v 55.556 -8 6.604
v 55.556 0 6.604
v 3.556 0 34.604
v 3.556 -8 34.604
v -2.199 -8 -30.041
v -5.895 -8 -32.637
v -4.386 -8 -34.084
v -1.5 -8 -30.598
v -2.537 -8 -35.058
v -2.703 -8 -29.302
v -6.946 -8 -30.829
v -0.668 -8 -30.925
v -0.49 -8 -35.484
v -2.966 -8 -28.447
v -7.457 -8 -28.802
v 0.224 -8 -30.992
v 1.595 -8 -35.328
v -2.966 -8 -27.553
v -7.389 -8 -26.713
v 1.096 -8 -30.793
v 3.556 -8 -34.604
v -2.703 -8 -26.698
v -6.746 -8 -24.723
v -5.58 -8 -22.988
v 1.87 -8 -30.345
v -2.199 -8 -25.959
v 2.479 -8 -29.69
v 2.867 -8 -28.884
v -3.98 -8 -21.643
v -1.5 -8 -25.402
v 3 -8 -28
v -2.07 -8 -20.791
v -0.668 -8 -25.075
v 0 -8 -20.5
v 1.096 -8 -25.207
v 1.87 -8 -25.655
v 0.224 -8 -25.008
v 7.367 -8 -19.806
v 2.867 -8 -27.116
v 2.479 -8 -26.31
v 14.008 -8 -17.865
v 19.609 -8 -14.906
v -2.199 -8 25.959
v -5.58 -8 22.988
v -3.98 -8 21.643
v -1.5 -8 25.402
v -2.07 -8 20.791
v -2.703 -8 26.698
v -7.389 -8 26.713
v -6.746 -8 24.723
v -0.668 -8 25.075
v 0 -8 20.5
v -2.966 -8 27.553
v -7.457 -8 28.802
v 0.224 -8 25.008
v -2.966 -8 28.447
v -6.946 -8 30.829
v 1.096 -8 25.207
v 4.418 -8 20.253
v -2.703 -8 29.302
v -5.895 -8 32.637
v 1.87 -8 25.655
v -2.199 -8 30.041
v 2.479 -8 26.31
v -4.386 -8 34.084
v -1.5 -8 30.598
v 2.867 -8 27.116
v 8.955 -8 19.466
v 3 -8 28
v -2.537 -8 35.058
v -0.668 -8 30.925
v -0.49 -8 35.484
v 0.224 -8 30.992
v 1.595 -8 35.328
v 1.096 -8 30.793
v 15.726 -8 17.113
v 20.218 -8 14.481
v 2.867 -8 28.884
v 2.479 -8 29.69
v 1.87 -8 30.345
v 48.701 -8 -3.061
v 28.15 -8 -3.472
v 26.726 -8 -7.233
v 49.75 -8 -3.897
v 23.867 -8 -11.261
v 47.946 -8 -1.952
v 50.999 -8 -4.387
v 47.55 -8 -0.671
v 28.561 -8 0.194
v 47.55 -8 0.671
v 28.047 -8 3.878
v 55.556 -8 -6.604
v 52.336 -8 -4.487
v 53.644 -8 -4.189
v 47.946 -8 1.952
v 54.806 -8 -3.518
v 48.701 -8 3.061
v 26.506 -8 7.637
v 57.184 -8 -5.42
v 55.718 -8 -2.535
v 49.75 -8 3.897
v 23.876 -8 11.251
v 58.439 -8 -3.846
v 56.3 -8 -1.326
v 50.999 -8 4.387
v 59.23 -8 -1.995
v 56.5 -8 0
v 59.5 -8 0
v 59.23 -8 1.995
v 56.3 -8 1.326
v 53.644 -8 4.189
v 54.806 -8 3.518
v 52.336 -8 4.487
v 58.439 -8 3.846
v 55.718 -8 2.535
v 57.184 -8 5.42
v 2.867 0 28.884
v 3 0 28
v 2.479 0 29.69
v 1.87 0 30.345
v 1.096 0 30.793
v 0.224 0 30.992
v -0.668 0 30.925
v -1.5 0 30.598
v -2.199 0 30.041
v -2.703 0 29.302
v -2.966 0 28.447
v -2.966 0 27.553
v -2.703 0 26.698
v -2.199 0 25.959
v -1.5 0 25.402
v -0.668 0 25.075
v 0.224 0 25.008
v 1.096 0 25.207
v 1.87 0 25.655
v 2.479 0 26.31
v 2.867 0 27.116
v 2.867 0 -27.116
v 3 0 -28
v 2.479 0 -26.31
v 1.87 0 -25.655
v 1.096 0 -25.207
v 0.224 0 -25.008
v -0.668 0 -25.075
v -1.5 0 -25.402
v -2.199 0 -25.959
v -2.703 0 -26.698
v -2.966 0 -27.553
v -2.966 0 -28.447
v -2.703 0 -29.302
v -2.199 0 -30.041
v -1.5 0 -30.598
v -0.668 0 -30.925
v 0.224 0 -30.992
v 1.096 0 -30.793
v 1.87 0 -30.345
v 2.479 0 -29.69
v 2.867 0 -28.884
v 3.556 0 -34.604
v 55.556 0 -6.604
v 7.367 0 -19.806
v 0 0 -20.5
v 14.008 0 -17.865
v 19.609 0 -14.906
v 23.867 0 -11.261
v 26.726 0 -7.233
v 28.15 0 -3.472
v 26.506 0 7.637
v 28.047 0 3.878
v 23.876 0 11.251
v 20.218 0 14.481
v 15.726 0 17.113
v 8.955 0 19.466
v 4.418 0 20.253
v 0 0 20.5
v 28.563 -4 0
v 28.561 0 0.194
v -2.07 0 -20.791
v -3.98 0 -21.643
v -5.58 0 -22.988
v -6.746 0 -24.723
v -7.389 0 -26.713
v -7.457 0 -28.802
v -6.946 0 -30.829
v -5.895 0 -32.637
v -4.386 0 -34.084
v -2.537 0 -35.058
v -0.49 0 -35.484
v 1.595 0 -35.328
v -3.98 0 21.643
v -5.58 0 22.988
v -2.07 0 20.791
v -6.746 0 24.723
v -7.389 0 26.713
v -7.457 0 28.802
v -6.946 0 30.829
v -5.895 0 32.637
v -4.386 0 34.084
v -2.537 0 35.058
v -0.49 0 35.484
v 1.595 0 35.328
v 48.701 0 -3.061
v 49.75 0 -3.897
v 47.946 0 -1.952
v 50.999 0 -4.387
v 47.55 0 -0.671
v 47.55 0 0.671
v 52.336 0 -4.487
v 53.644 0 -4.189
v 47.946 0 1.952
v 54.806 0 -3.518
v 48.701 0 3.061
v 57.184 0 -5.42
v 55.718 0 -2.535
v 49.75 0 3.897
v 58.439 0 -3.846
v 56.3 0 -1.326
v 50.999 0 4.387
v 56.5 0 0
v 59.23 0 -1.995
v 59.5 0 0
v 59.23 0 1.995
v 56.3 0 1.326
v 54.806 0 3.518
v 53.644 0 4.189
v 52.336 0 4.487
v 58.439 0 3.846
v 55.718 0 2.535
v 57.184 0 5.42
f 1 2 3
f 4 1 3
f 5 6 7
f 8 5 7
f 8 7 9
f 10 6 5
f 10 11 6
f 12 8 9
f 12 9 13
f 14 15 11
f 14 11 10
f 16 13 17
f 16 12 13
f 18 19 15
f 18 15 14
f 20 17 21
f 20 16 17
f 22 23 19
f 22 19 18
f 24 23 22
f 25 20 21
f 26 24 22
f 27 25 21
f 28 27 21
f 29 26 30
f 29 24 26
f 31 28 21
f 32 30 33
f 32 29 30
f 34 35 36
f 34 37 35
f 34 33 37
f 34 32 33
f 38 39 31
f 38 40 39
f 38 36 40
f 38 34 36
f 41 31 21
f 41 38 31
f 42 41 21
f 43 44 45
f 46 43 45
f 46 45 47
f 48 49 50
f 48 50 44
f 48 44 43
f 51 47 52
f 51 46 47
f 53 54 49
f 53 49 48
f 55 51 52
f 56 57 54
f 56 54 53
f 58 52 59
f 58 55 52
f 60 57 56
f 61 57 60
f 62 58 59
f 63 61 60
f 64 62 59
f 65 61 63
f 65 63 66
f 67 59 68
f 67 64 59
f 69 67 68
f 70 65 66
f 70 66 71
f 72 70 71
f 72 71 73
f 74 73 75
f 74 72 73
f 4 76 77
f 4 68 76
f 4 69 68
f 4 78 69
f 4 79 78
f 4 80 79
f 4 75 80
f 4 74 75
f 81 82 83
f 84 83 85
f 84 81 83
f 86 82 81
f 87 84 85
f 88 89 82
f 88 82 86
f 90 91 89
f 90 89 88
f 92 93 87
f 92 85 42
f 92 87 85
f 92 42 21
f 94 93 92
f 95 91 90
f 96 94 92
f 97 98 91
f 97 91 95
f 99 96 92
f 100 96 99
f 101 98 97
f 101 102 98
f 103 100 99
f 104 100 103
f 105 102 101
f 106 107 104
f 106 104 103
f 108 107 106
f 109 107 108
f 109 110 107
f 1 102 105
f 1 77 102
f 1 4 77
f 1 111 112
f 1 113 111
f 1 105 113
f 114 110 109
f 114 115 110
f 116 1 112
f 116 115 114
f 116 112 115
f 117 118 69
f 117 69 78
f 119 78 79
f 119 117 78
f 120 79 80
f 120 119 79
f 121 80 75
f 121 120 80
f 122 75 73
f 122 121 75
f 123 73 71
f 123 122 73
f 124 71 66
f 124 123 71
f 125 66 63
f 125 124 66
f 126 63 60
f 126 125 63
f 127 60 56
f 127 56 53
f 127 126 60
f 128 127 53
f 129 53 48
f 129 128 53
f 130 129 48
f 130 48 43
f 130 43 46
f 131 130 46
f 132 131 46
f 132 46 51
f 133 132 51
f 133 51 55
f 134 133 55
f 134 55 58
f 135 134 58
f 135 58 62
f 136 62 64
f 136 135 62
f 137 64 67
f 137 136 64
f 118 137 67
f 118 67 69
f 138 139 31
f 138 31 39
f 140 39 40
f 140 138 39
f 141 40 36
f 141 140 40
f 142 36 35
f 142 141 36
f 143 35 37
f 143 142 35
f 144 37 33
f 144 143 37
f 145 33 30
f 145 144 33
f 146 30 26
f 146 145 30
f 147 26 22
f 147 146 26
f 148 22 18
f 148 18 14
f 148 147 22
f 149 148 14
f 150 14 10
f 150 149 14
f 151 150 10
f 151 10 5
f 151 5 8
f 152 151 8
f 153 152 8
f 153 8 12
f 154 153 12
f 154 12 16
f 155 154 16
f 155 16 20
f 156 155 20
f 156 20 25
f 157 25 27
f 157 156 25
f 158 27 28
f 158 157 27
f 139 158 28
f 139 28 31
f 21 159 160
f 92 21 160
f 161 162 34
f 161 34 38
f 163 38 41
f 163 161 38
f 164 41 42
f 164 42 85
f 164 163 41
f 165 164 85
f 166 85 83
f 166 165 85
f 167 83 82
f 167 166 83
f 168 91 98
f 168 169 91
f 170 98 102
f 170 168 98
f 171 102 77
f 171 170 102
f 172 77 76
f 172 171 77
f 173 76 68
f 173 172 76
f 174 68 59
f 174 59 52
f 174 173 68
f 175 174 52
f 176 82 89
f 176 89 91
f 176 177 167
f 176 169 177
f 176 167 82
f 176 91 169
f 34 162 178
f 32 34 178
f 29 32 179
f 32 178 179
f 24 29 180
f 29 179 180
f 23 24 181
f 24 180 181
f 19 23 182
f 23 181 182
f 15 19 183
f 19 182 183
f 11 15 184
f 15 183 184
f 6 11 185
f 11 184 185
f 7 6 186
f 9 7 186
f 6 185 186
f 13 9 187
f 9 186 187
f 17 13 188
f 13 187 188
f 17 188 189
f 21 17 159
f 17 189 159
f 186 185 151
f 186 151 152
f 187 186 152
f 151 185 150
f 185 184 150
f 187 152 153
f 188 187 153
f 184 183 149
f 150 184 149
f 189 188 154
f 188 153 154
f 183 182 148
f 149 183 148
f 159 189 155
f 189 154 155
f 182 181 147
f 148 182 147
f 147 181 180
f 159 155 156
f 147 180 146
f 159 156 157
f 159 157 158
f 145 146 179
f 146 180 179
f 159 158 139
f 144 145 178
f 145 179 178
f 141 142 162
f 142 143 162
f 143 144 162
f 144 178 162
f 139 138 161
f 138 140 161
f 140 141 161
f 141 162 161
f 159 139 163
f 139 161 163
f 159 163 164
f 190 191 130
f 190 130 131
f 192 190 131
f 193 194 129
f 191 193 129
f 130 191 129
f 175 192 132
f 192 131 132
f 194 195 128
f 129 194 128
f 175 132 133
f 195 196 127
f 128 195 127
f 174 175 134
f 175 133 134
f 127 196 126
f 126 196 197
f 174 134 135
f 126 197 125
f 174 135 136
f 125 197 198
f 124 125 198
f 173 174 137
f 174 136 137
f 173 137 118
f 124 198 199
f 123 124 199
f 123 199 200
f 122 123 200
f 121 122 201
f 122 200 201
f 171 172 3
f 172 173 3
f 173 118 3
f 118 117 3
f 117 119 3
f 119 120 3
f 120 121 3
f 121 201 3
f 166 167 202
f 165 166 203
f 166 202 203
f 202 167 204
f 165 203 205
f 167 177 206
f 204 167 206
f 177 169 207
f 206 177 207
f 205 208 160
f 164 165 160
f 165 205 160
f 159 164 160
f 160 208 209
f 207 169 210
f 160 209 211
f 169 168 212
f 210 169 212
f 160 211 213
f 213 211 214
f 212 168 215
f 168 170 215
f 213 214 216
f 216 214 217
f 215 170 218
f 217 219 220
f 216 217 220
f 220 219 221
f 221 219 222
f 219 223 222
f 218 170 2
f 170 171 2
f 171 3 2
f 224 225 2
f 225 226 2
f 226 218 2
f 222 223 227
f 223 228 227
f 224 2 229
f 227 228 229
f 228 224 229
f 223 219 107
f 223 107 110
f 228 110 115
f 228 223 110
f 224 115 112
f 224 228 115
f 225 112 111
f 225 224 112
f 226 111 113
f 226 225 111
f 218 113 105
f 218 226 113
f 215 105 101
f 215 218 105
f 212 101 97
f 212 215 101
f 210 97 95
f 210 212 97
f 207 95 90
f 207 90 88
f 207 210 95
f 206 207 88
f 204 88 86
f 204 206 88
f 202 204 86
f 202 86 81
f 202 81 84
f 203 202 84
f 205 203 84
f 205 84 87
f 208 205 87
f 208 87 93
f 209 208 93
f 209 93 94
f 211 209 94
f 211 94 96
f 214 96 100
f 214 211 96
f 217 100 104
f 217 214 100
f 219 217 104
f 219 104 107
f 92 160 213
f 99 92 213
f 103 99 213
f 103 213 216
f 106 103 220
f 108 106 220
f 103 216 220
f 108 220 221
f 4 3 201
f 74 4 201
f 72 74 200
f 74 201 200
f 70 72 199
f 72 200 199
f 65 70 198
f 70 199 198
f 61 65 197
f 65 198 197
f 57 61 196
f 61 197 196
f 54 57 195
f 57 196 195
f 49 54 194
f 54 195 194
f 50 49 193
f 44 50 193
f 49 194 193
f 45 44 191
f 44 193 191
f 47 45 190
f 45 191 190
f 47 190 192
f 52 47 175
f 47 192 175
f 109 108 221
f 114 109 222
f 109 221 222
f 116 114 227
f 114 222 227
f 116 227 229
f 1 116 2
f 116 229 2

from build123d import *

# Parameters (mm, degrees)
F0_R     = 3
F0_R_2   = 4.5
F1_DEPTH = 8


with BuildPart() as f1:
    # F0 (on Front) → F1 (new body)
    with BuildSketch(Plane.XZ):
        with BuildLine():
            ThreePointArc((0, 20.5), (5.3033008589, 22.6966991411), (7.5, 28))
            ThreePointArc((7.5, 28), (6.4388708267, 31.8458994367), (3.5557486728, 34.6035332494))
            ThreePointArc((3.5557486728, 34.6035332494), (-7.2724307962, 29.8335076533), (0, 20.5))
        make_face()
        with Locations((0, 28)):
            Circle(F0_R, mode=Mode.SUBTRACT)
        with BuildLine():
            ThreePointArc((3.5557486728, 34.6035332494), (6.4388708267, 31.8458994367), (7.5, 28))
            ThreePointArc((7.5, 28), (5.3033008589, 22.6966991411), (0, 20.5))
            add(Edge.make_bspline(
                [(0, -20.5), (28.5625234834, -20.5), (28.5625234834, 0), (28.5625234834, 20.5), (0, 20.5)],
                knots=[4.7123889804, 4.7123889804, 4.7123889804, 6.2831853072, 6.2831853072, 7.853981634, 7.853981634, 7.853981634], degree=2, weights=[1, 0.7071067812, 1, 0.7071067812, 1]))
            ThreePointArc((0, -20.5), (5.3033008589, -22.6966991411), (7.5, -28))
            ThreePointArc((7.5, -28), (6.4388708267, -31.8458994367), (3.5557486728, -34.6035332494))
            Line((3.5557486728, -34.6035332494), (55.5557486728, -6.6035332494))
            ThreePointArc((55.5557486728, -6.6035332494), (44.5, 0), (55.5557486728, 6.6035332494))
            Line((55.5557486728, 6.6035332494), (3.5557486728, 34.6035332494))
        make_face()
        with BuildLine():
            ThreePointArc((59.5, 0), (58.4388708267, 3.8458994367), (55.5557486728, 6.6035332494))
            ThreePointArc((55.5557486728, 6.6035332494), (44.5, 0), (55.5557486728, -6.6035332494))
            ThreePointArc((55.5557486728, -6.6035332494), (58.4388708267, -3.8458994367), (59.5, 0))
        make_face()
        with Locations((52, 0)):
            Circle(F0_R_2, mode=Mode.SUBTRACT)
        with BuildLine():
            ThreePointArc((7.5, -28), (5.3033008589, -22.6966991411), (0, -20.5))
            ThreePointArc((0, -20.5), (-7.2724307962, -29.8335076533), (3.5557486728, -34.6035332494))
            ThreePointArc((3.5557486728, -34.6035332494), (6.4388708267, -31.8458994367), (7.5, -28))
        make_face()
        with Locations((0, -28)):
            Circle(F0_R, mode=Mode.SUBTRACT)
    extrude(amount=F1_DEPTH)


solid = f1.part
